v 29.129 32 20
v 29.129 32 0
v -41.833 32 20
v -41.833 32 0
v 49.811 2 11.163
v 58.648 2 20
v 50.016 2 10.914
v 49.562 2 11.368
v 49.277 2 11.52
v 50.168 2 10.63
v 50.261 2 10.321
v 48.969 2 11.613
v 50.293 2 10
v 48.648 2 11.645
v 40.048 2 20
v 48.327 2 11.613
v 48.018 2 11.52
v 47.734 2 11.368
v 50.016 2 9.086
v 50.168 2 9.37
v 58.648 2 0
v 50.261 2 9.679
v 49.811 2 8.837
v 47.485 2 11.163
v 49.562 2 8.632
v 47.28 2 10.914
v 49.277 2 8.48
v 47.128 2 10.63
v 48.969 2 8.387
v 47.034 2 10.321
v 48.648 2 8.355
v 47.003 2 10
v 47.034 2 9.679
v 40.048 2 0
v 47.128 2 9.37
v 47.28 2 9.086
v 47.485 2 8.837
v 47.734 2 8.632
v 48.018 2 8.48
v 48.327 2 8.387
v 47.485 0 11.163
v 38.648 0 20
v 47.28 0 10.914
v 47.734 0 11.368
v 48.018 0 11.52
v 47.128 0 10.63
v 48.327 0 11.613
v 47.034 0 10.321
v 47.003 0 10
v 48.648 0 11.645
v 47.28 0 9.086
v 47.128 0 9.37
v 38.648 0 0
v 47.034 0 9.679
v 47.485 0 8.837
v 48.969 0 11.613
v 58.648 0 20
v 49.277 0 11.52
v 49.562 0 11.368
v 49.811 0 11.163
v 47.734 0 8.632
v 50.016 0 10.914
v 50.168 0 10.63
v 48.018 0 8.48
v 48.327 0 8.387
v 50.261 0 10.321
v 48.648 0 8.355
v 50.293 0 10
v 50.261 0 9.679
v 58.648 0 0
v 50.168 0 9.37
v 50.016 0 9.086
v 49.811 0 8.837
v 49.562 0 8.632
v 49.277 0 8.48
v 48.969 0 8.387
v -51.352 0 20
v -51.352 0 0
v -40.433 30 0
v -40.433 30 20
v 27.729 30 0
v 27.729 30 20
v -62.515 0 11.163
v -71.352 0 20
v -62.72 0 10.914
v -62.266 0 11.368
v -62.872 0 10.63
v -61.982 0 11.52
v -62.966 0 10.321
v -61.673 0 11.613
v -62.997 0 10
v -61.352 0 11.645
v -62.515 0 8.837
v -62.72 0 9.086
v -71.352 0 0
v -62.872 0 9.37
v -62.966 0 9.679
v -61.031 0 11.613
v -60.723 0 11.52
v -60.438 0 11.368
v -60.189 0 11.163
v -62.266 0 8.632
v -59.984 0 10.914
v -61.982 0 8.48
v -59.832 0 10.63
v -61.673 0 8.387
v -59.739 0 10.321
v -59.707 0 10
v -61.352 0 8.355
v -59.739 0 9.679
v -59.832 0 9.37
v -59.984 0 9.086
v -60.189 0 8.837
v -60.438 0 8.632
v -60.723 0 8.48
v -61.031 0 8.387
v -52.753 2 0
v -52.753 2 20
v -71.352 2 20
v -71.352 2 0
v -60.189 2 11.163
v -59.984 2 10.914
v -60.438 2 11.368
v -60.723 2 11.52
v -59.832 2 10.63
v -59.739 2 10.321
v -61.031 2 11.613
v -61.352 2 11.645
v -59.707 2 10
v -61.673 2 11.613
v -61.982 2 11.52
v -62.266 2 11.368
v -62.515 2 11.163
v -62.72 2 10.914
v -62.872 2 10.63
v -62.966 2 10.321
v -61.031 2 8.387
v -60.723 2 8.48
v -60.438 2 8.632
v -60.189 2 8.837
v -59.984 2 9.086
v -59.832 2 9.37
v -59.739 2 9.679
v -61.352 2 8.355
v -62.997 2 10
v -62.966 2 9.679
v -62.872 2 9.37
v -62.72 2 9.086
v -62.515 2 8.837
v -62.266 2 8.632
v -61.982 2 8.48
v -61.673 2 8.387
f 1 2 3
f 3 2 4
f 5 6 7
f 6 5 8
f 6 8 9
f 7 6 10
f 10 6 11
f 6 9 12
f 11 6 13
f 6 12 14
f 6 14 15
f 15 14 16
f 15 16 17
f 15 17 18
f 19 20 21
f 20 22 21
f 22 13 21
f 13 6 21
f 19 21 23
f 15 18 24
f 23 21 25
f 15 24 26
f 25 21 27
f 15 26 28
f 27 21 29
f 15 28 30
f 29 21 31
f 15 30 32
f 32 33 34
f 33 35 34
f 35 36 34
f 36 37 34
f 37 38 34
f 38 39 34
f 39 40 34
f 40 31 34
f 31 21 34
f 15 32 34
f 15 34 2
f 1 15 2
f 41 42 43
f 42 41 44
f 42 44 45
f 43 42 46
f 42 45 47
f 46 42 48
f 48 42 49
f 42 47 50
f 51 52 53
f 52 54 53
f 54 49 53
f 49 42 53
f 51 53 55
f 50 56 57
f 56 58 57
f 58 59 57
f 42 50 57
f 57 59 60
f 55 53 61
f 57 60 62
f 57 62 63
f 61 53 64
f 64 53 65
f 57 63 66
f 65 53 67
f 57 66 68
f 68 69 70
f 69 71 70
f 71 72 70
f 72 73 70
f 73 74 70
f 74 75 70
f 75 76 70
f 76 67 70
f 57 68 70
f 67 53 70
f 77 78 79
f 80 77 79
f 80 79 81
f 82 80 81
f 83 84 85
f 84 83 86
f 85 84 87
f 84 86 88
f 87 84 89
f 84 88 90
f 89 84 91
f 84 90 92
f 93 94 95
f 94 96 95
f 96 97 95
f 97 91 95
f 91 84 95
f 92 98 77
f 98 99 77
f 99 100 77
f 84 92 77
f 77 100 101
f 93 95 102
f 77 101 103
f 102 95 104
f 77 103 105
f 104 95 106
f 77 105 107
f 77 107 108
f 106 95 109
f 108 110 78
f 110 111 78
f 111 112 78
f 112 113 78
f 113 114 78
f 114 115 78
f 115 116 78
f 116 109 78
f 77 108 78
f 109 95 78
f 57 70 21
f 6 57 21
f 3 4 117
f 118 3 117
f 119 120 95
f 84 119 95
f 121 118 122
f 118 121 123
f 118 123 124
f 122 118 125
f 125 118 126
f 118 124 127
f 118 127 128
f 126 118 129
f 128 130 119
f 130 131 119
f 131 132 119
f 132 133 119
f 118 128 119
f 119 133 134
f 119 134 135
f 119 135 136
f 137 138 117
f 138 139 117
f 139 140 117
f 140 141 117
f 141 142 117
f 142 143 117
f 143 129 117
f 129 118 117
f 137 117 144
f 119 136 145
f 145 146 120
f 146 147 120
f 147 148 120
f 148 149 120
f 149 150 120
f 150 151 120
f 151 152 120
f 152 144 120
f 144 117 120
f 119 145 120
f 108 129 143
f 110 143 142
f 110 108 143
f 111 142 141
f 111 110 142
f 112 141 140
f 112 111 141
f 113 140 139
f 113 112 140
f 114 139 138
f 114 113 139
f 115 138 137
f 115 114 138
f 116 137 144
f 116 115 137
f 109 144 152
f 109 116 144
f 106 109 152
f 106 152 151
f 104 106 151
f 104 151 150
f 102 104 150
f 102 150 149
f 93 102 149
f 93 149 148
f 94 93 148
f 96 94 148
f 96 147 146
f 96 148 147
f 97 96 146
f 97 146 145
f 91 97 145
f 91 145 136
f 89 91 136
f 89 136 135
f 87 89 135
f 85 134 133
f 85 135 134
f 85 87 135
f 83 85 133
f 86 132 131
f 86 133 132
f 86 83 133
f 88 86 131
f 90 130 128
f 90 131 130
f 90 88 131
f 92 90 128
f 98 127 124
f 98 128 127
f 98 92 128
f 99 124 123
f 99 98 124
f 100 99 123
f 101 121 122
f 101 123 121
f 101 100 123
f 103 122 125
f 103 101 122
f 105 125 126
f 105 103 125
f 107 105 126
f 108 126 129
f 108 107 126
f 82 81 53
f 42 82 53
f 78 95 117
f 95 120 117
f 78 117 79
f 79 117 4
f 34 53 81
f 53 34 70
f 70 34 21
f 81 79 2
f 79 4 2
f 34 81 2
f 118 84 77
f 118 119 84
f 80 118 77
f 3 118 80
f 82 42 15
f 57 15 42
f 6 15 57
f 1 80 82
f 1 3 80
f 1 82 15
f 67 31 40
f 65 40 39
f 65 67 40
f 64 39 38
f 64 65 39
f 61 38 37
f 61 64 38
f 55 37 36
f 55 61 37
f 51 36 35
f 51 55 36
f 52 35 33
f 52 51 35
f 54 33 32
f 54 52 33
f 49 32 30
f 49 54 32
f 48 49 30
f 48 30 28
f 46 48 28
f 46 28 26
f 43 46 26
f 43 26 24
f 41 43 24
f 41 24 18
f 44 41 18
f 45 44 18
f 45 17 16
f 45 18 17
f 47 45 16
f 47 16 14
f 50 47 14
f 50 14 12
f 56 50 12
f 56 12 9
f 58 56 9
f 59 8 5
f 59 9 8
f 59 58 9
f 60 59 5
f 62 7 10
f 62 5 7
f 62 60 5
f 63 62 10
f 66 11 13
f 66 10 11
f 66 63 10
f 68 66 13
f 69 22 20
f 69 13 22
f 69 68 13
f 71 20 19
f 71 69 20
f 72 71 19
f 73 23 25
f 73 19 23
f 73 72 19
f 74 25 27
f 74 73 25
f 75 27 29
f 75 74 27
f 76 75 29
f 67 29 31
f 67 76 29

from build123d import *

# Parameters (mm, degrees)
EXTRUDE_1_DEPTH     = 20
SKETCH_2_R          = 1.645091665
CUT_EXTRUDE_1_DEPTH = 20


with BuildPart() as part:
    # 草图1 → 凸台-拉伸1 (new body)
    with BuildSketch(Plane.XY):
        Polygon((-71.352101151, 0), (-51.352101151, 0), (-40.432994123, 30), (27.728791821, 30), (38.647898849, 0), (58.647898849, 0), (58.647898849, 2), (40.048313925, 2), (29.129206897, 32), (-41.8334092, 32), (-52.752516228, 2), (-71.352101151, 2), align=None)
    extrude(amount=EXTRUDE_1_DEPTH)

    # 草图2 → 切除-拉伸1 (cut)
    with BuildSketch(Plane(origin=(0, 0, 0), x_dir=(1, 0, 0), z_dir=(0, 1, 0))):
        with Locations((-61.352101151, -10)):
            Circle(SKETCH_2_R)
        with Locations(Location((48.647898849, -10, 0), (0, 0, 90))):
            Circle(SKETCH_2_R)
    extrude(amount=CUT_EXTRUDE_1_DEPTH, mode=Mode.SUBTRACT)


solid = part.part
